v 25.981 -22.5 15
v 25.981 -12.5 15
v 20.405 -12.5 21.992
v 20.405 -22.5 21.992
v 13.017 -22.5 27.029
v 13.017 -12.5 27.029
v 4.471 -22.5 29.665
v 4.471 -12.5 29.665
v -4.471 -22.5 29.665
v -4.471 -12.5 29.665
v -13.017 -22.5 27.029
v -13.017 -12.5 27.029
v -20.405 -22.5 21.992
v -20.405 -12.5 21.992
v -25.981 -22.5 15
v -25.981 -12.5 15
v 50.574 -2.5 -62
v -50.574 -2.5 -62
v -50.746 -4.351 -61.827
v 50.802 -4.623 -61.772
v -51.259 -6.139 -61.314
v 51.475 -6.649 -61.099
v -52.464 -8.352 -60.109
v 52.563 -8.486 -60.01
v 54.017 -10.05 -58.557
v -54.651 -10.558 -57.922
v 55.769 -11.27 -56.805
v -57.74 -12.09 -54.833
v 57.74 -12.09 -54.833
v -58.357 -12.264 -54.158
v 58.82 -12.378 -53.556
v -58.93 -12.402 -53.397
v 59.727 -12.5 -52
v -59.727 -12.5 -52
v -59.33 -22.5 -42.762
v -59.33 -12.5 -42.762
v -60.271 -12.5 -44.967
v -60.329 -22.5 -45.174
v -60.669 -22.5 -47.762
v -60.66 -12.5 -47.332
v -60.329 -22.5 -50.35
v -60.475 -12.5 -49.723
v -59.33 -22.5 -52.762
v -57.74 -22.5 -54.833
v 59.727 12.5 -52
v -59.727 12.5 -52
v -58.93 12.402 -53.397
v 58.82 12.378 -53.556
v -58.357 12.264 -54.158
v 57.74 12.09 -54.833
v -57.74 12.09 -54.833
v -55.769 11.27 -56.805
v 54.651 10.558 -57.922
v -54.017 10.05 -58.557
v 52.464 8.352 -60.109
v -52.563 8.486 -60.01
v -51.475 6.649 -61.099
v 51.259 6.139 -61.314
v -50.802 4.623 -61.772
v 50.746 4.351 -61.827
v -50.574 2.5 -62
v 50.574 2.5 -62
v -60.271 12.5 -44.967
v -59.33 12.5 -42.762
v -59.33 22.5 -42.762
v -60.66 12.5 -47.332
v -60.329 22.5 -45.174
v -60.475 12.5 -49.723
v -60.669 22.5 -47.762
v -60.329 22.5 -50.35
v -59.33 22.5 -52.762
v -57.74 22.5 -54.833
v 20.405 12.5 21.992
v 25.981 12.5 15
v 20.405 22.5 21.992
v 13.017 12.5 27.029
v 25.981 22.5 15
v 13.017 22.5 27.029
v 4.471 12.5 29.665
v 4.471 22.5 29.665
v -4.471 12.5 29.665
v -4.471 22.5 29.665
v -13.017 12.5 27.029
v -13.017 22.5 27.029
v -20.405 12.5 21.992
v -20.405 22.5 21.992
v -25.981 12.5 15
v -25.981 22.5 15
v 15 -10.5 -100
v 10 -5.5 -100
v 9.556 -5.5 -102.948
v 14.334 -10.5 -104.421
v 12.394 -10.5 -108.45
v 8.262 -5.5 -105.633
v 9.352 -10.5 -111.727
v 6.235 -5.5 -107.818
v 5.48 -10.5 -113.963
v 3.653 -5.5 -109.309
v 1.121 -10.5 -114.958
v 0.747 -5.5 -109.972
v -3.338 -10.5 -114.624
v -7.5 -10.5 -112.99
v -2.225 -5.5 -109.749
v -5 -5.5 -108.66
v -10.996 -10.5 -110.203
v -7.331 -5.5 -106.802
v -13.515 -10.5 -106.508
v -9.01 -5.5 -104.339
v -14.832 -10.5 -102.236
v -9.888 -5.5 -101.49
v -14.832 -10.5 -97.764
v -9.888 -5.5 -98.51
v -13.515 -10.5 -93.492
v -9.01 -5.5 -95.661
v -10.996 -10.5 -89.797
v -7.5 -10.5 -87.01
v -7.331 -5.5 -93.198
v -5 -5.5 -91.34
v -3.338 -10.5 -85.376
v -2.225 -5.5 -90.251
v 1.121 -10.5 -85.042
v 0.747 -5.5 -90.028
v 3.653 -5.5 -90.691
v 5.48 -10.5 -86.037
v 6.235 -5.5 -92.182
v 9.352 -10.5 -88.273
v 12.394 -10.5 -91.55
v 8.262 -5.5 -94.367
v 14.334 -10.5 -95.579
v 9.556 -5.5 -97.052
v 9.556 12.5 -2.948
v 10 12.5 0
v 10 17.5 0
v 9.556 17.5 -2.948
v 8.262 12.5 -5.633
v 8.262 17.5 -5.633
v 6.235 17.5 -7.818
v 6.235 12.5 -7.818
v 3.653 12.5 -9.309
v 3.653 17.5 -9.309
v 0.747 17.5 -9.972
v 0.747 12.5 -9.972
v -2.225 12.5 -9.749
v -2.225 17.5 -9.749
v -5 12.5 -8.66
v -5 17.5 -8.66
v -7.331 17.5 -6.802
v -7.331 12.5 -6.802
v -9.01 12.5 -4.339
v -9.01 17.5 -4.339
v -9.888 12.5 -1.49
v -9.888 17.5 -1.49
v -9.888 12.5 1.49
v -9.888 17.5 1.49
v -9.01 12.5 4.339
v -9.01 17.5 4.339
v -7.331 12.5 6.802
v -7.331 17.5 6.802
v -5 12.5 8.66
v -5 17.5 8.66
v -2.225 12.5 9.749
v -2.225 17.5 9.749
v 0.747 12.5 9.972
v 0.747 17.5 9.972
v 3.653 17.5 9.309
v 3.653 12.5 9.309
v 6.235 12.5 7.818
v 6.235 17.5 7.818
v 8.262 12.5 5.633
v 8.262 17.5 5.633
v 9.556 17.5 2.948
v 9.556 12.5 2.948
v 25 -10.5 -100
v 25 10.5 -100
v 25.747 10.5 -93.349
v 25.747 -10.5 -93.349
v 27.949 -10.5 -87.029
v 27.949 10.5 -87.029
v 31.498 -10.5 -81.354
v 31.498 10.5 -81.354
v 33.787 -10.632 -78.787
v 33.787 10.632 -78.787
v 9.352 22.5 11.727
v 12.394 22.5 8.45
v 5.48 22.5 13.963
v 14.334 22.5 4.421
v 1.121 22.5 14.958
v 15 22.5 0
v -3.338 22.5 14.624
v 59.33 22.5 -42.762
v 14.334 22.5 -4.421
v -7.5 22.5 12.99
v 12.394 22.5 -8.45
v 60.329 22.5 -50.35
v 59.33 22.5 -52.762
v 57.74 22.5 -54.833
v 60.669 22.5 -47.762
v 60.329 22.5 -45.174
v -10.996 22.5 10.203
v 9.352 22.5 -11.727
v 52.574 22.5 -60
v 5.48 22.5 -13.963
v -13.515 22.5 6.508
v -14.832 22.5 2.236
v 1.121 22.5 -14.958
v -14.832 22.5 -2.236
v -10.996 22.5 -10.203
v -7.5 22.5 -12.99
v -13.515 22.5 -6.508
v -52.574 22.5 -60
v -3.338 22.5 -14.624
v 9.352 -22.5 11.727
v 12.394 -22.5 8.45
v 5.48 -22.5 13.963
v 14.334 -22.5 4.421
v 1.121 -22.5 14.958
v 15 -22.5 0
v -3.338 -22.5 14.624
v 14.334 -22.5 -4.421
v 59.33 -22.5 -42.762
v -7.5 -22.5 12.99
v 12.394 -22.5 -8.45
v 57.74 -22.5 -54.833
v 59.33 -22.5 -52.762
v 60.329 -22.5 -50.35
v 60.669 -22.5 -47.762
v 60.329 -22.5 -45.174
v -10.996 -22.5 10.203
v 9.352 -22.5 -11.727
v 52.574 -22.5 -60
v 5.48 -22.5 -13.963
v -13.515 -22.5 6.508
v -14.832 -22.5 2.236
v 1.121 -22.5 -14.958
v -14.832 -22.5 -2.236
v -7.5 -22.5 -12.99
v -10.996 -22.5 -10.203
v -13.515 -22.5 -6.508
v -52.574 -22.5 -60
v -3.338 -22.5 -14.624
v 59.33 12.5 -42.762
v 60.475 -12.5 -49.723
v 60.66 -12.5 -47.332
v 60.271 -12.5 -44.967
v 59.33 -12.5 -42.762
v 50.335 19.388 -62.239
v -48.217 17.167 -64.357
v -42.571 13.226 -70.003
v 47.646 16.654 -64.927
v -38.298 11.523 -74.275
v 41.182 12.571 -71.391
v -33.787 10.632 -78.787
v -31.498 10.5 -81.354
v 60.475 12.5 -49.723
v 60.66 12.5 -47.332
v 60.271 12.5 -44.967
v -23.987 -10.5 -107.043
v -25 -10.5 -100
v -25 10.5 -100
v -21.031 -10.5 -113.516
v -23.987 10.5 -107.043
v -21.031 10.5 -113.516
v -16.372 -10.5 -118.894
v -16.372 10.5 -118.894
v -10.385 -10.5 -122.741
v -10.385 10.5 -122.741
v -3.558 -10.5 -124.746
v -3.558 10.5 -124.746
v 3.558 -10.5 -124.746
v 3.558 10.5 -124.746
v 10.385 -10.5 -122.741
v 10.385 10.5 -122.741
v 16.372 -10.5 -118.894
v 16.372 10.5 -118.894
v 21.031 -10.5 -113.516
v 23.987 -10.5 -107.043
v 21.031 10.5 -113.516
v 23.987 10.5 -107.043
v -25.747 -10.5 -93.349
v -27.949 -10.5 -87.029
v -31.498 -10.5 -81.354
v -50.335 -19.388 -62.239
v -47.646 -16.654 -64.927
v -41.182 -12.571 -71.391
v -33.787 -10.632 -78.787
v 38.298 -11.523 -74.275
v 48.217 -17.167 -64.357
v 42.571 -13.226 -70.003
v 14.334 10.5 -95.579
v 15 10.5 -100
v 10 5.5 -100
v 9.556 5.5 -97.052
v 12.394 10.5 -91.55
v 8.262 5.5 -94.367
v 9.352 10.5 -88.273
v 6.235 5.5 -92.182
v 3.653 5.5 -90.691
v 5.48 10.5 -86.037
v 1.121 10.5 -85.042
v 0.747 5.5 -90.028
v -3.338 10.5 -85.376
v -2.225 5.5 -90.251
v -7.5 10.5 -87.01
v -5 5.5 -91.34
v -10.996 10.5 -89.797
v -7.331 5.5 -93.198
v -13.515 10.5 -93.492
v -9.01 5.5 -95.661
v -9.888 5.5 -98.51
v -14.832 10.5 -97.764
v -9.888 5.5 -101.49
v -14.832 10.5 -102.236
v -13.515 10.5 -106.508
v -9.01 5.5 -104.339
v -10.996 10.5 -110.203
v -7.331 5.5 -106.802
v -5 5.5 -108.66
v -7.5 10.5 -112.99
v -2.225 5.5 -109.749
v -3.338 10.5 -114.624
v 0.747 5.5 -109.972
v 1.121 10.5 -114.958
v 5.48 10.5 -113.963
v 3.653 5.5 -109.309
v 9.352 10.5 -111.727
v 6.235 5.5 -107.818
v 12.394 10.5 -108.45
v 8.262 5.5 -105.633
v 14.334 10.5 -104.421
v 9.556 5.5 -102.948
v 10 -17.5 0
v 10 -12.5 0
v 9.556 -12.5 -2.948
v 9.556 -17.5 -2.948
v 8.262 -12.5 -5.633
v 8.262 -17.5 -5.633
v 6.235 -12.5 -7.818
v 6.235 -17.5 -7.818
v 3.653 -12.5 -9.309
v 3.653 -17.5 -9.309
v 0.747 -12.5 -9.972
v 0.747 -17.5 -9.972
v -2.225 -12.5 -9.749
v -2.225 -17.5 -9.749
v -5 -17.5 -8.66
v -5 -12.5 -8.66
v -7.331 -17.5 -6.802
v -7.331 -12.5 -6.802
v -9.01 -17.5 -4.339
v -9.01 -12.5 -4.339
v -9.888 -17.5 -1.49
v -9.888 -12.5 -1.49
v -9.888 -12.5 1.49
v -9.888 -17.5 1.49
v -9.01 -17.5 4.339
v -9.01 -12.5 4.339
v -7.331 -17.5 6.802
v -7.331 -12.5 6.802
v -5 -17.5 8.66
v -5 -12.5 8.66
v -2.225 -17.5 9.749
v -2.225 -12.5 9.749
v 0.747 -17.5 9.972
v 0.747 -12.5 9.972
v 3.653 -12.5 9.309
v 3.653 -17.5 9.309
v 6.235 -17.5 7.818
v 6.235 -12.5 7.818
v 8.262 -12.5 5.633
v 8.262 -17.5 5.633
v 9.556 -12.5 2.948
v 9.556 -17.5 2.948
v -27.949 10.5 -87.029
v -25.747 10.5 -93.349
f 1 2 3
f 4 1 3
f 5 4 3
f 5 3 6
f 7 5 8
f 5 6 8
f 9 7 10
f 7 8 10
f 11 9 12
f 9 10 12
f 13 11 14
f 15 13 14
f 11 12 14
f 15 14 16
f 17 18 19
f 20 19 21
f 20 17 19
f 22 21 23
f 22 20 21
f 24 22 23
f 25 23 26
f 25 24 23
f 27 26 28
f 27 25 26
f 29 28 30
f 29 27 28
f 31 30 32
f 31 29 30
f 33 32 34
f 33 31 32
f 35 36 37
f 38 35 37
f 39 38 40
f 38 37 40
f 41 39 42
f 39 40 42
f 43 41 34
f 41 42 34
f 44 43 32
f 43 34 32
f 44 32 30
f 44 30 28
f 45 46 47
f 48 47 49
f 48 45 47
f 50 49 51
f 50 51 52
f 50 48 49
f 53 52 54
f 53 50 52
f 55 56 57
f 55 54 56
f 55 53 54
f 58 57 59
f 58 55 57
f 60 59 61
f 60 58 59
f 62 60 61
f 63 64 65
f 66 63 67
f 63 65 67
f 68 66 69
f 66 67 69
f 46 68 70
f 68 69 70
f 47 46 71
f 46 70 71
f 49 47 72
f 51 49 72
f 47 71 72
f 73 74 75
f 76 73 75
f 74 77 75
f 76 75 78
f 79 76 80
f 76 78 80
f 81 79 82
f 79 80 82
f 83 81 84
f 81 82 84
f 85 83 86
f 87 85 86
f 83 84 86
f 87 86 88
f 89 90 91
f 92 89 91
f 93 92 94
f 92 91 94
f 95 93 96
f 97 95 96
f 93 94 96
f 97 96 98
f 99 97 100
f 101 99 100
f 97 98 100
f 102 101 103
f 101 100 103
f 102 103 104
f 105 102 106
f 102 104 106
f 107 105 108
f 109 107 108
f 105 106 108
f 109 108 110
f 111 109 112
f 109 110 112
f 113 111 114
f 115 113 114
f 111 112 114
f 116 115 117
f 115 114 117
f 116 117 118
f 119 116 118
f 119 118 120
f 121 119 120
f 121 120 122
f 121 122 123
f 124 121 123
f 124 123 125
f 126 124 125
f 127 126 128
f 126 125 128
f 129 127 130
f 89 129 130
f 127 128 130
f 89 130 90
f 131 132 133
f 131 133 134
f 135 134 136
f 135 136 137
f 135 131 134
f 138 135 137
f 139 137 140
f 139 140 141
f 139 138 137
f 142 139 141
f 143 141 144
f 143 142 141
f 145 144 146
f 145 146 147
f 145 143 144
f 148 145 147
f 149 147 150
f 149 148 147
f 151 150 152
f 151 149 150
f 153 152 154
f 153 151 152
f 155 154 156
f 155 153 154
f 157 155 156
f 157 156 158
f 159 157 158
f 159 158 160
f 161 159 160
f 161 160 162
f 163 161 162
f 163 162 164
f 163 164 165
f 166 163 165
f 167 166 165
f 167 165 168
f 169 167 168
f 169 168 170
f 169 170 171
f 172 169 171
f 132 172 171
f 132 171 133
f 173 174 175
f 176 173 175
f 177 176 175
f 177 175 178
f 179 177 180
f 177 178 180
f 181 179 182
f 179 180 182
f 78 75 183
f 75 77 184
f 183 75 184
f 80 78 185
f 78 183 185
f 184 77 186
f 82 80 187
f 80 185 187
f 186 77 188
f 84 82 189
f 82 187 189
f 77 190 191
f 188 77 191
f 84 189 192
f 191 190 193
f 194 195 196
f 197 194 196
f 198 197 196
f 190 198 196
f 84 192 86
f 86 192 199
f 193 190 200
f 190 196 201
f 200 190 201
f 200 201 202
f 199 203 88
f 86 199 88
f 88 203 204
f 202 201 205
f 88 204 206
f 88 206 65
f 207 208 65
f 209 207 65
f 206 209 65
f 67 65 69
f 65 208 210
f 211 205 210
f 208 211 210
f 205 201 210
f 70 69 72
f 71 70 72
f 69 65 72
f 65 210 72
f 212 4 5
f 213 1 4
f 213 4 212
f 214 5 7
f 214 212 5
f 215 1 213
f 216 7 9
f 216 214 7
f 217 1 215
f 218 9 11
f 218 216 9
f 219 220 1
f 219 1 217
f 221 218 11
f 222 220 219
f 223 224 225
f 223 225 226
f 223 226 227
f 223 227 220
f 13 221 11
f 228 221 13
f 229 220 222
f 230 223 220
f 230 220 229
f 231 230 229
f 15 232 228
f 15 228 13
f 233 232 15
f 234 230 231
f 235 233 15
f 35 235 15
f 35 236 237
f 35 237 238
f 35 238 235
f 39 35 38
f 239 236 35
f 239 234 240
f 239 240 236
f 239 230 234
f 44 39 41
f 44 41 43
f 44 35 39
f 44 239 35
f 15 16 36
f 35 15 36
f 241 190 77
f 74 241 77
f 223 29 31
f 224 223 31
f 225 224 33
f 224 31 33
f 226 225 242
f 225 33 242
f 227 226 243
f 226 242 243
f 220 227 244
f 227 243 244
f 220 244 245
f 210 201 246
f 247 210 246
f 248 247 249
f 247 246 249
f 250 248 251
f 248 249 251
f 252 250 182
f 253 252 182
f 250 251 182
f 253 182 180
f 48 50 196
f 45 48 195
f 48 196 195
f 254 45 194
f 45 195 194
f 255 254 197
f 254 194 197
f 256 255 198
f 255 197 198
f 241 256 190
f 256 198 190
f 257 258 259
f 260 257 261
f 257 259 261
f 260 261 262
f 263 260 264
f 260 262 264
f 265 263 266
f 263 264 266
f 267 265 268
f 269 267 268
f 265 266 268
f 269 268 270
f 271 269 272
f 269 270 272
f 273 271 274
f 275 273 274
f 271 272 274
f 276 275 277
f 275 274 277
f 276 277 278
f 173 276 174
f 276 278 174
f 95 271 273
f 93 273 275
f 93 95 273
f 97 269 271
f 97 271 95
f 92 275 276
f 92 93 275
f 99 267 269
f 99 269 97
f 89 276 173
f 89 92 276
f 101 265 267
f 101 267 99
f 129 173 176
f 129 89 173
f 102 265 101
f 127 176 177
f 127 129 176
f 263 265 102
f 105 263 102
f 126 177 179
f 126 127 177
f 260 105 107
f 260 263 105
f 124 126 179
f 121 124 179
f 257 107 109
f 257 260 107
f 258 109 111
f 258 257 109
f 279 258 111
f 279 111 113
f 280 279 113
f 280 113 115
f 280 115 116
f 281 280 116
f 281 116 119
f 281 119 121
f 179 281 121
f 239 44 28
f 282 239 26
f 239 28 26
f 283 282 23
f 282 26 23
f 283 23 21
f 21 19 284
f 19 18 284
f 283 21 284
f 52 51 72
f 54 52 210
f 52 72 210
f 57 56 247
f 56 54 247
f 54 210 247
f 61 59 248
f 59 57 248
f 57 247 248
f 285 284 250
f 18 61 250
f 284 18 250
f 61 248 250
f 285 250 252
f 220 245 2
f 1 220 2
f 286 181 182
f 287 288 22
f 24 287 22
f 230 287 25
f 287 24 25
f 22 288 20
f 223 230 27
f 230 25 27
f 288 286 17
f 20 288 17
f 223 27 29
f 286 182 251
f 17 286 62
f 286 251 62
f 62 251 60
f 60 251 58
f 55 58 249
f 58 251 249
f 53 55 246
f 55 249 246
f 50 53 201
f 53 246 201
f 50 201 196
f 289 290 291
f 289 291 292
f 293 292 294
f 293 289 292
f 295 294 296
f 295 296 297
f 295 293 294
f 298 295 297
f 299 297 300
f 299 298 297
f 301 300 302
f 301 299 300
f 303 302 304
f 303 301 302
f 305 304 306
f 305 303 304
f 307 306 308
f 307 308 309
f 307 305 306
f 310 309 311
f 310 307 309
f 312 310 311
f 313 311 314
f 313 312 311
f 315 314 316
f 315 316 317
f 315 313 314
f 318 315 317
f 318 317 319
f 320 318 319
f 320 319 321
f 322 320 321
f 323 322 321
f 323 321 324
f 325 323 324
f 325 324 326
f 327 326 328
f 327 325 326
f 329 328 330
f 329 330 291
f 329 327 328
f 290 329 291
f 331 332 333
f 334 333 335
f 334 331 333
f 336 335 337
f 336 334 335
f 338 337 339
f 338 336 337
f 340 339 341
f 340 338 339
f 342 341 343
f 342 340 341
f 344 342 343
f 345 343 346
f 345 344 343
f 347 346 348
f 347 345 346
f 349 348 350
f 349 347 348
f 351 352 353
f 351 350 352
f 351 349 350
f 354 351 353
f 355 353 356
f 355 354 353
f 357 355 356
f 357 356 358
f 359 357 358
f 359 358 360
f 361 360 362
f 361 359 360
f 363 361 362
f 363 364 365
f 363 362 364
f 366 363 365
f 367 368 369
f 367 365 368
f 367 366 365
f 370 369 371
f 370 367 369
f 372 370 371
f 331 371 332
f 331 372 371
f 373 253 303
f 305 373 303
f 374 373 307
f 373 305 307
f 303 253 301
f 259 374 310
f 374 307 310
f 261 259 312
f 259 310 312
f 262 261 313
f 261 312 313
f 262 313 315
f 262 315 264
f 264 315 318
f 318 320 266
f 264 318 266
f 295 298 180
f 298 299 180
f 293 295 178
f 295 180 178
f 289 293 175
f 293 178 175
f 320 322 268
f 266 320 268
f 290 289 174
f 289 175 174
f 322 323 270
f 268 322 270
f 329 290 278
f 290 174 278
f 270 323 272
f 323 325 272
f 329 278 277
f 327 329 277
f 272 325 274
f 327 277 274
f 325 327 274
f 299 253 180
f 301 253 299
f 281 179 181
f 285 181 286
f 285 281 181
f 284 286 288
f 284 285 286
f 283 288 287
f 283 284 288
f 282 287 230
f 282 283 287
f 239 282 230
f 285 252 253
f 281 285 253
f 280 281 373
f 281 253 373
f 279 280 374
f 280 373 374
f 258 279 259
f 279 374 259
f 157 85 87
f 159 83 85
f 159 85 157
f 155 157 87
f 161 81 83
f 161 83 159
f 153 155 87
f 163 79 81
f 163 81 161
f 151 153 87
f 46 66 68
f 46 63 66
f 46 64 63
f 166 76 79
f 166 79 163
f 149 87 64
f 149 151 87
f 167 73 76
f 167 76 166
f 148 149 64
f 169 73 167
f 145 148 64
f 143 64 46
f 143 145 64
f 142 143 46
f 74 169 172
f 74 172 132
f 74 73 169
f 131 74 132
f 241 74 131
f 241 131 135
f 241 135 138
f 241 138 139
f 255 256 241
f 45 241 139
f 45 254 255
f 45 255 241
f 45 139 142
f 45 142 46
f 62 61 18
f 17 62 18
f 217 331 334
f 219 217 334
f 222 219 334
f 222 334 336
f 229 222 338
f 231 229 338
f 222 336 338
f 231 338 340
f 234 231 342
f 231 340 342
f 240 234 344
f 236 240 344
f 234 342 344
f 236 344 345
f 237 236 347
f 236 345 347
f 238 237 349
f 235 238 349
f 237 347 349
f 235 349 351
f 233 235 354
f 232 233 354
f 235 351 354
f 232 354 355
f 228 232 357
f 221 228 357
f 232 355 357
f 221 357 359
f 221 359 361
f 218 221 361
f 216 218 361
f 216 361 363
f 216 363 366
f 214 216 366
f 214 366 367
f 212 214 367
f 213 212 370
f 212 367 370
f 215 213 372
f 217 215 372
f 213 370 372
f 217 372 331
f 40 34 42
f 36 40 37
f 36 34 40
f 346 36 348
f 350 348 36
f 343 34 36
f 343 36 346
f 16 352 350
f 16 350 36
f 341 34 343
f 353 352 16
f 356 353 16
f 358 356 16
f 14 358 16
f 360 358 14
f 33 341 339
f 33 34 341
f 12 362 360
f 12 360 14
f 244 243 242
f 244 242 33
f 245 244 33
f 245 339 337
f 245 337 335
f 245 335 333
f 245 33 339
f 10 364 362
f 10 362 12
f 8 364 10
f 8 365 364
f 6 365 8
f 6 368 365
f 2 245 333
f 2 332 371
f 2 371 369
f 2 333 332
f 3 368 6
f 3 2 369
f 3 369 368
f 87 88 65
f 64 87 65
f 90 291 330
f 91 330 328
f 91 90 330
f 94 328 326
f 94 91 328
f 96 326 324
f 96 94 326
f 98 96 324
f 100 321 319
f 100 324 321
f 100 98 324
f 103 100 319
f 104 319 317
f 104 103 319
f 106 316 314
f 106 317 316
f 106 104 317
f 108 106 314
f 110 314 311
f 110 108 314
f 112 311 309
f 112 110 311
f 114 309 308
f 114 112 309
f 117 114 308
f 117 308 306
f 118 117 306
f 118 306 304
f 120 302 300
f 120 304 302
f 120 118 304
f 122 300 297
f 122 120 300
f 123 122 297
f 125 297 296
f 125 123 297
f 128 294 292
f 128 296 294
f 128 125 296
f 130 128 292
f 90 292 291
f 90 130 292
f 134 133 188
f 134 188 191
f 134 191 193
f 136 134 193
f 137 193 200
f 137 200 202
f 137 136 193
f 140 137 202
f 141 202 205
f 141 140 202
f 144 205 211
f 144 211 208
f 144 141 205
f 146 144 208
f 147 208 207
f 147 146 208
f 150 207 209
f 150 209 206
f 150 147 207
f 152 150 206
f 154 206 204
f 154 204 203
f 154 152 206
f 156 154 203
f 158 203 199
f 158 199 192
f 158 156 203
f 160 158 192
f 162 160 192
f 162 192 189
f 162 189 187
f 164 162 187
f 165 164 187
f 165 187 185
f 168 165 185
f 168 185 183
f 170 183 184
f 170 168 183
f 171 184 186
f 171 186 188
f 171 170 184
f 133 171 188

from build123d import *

# Parameters (mm, degrees)
SKETCH1_R               = 10
BOSS_EXTRUDE1_DEPTH     = 22.5
CUT_EXTRUDE1_DEPTH      = 61.66943013
CUT_EXTRUDE1_DEPTH_BACK = 61.66943013
CHAMFER1_SIZE           = 5


with BuildPart() as part:
    # Sketch1 → Boss-Extrude1 (new body, symmetric)
    with BuildSketch(Plane(origin=(0, 0, 0), x_dir=(1, 0, 0), z_dir=(0, 1, 0))):
        with BuildLine():
            Line((-25.980762114, -15), (-59.329684168, 42.762027375))
            ThreePointArc((-59.329684168, 42.762027375), (-60.583878744, 49.067289298), (-57.740497942, 54.833095187))
            Line((-57.740497942, 54.833095187), (-33.786796564, 78.786796564))
            ThreePointArc((-33.786796564, 78.786796564), (-27.283614025, 88.519497029), (-25, 100))
            ThreePointArc((-25, 100), (0, 125), (25, 100))
            ThreePointArc((25, 100), (27.283614025, 88.519497029), (33.786796564, 78.786796564))
            Line((33.786796564, 78.786796564), (57.740497942, 54.833095187))
            ThreePointArc((57.740497942, 54.833095187), (60.583878744, 49.067289298), (59.329684168, 42.762027375))
            Line((59.329684168, 42.762027375), (25.980762114, -15))
            ThreePointArc((25.980762114, -15), (0, -30), (-25.980762114, -15))
        make_face()
        with Locations((0, 100)):
            Circle(SKETCH1_R, mode=Mode.SUBTRACT)
        Circle(SKETCH1_R, mode=Mode.SUBTRACT)
    extrude(amount=BOSS_EXTRUDE1_DEPTH, both=True)

    # Sketch2 → Cut-Extrude1 (cut, two sides)
    with BuildSketch(Plane(origin=(0, 0, 0), x_dir=(0, 0, -1), z_dir=(1, 0, 0))) as cut_extrude1_sk:
        with BuildLine():
            Line((-30, 12.5), (52, 12.5))
            ThreePointArc((52, 12.5), (59.071067812, 9.571067812), (62, 2.5))
            Line((62, 2.5), (62, -2.5))
            ThreePointArc((62, -2.5), (59.071067812, -9.571067812), (52, -12.5))
            Line((52, -12.5), (-30, -12.5))
            Line((-30, -12.5), (-30, 12.5))
        make_face()
        with BuildLine():
            Line((81.354156504, 10.5), (125, 10.5))
            Line((125, 10.5), (125, 22.5))
            Line((125, 22.5), (78.786796564, 22.5))
            Line((78.786796564, 22.5), (60, 22.5))
            ThreePointArc((60, 22.5), (69.10670779, 13.705505282), (81.354156504, 10.5))
        make_face()
        with BuildLine():
            Line((125, -22.5), (125, -10.5))
            Line((125, -10.5), (81.354156504, -10.5))
            ThreePointArc((81.354156504, -10.5), (69.10670779, -13.705505282), (60, -22.5))
            Line((60, -22.5), (78.786796564, -22.5))
            Line((78.786796564, -22.5), (125, -22.5))
        make_face()
    extrude(amount=CUT_EXTRUDE1_DEPTH, mode=Mode.SUBTRACT)
    extrude(cut_extrude1_sk.sketch, amount=-CUT_EXTRUDE1_DEPTH_BACK, mode=Mode.SUBTRACT)

    # Chamfer1
    chamfer1_edges = [part.edges().sort_by_distance(p)[0] for p in [
        (-10, -22.5, 0),
        (-10, 22.5, 0),
        (-10, -10.5, -100),
        (-10, 10.5, -100),
    ]]
    chamfer(chamfer1_edges, length=CHAMFER1_SIZE)


solid = part.part
